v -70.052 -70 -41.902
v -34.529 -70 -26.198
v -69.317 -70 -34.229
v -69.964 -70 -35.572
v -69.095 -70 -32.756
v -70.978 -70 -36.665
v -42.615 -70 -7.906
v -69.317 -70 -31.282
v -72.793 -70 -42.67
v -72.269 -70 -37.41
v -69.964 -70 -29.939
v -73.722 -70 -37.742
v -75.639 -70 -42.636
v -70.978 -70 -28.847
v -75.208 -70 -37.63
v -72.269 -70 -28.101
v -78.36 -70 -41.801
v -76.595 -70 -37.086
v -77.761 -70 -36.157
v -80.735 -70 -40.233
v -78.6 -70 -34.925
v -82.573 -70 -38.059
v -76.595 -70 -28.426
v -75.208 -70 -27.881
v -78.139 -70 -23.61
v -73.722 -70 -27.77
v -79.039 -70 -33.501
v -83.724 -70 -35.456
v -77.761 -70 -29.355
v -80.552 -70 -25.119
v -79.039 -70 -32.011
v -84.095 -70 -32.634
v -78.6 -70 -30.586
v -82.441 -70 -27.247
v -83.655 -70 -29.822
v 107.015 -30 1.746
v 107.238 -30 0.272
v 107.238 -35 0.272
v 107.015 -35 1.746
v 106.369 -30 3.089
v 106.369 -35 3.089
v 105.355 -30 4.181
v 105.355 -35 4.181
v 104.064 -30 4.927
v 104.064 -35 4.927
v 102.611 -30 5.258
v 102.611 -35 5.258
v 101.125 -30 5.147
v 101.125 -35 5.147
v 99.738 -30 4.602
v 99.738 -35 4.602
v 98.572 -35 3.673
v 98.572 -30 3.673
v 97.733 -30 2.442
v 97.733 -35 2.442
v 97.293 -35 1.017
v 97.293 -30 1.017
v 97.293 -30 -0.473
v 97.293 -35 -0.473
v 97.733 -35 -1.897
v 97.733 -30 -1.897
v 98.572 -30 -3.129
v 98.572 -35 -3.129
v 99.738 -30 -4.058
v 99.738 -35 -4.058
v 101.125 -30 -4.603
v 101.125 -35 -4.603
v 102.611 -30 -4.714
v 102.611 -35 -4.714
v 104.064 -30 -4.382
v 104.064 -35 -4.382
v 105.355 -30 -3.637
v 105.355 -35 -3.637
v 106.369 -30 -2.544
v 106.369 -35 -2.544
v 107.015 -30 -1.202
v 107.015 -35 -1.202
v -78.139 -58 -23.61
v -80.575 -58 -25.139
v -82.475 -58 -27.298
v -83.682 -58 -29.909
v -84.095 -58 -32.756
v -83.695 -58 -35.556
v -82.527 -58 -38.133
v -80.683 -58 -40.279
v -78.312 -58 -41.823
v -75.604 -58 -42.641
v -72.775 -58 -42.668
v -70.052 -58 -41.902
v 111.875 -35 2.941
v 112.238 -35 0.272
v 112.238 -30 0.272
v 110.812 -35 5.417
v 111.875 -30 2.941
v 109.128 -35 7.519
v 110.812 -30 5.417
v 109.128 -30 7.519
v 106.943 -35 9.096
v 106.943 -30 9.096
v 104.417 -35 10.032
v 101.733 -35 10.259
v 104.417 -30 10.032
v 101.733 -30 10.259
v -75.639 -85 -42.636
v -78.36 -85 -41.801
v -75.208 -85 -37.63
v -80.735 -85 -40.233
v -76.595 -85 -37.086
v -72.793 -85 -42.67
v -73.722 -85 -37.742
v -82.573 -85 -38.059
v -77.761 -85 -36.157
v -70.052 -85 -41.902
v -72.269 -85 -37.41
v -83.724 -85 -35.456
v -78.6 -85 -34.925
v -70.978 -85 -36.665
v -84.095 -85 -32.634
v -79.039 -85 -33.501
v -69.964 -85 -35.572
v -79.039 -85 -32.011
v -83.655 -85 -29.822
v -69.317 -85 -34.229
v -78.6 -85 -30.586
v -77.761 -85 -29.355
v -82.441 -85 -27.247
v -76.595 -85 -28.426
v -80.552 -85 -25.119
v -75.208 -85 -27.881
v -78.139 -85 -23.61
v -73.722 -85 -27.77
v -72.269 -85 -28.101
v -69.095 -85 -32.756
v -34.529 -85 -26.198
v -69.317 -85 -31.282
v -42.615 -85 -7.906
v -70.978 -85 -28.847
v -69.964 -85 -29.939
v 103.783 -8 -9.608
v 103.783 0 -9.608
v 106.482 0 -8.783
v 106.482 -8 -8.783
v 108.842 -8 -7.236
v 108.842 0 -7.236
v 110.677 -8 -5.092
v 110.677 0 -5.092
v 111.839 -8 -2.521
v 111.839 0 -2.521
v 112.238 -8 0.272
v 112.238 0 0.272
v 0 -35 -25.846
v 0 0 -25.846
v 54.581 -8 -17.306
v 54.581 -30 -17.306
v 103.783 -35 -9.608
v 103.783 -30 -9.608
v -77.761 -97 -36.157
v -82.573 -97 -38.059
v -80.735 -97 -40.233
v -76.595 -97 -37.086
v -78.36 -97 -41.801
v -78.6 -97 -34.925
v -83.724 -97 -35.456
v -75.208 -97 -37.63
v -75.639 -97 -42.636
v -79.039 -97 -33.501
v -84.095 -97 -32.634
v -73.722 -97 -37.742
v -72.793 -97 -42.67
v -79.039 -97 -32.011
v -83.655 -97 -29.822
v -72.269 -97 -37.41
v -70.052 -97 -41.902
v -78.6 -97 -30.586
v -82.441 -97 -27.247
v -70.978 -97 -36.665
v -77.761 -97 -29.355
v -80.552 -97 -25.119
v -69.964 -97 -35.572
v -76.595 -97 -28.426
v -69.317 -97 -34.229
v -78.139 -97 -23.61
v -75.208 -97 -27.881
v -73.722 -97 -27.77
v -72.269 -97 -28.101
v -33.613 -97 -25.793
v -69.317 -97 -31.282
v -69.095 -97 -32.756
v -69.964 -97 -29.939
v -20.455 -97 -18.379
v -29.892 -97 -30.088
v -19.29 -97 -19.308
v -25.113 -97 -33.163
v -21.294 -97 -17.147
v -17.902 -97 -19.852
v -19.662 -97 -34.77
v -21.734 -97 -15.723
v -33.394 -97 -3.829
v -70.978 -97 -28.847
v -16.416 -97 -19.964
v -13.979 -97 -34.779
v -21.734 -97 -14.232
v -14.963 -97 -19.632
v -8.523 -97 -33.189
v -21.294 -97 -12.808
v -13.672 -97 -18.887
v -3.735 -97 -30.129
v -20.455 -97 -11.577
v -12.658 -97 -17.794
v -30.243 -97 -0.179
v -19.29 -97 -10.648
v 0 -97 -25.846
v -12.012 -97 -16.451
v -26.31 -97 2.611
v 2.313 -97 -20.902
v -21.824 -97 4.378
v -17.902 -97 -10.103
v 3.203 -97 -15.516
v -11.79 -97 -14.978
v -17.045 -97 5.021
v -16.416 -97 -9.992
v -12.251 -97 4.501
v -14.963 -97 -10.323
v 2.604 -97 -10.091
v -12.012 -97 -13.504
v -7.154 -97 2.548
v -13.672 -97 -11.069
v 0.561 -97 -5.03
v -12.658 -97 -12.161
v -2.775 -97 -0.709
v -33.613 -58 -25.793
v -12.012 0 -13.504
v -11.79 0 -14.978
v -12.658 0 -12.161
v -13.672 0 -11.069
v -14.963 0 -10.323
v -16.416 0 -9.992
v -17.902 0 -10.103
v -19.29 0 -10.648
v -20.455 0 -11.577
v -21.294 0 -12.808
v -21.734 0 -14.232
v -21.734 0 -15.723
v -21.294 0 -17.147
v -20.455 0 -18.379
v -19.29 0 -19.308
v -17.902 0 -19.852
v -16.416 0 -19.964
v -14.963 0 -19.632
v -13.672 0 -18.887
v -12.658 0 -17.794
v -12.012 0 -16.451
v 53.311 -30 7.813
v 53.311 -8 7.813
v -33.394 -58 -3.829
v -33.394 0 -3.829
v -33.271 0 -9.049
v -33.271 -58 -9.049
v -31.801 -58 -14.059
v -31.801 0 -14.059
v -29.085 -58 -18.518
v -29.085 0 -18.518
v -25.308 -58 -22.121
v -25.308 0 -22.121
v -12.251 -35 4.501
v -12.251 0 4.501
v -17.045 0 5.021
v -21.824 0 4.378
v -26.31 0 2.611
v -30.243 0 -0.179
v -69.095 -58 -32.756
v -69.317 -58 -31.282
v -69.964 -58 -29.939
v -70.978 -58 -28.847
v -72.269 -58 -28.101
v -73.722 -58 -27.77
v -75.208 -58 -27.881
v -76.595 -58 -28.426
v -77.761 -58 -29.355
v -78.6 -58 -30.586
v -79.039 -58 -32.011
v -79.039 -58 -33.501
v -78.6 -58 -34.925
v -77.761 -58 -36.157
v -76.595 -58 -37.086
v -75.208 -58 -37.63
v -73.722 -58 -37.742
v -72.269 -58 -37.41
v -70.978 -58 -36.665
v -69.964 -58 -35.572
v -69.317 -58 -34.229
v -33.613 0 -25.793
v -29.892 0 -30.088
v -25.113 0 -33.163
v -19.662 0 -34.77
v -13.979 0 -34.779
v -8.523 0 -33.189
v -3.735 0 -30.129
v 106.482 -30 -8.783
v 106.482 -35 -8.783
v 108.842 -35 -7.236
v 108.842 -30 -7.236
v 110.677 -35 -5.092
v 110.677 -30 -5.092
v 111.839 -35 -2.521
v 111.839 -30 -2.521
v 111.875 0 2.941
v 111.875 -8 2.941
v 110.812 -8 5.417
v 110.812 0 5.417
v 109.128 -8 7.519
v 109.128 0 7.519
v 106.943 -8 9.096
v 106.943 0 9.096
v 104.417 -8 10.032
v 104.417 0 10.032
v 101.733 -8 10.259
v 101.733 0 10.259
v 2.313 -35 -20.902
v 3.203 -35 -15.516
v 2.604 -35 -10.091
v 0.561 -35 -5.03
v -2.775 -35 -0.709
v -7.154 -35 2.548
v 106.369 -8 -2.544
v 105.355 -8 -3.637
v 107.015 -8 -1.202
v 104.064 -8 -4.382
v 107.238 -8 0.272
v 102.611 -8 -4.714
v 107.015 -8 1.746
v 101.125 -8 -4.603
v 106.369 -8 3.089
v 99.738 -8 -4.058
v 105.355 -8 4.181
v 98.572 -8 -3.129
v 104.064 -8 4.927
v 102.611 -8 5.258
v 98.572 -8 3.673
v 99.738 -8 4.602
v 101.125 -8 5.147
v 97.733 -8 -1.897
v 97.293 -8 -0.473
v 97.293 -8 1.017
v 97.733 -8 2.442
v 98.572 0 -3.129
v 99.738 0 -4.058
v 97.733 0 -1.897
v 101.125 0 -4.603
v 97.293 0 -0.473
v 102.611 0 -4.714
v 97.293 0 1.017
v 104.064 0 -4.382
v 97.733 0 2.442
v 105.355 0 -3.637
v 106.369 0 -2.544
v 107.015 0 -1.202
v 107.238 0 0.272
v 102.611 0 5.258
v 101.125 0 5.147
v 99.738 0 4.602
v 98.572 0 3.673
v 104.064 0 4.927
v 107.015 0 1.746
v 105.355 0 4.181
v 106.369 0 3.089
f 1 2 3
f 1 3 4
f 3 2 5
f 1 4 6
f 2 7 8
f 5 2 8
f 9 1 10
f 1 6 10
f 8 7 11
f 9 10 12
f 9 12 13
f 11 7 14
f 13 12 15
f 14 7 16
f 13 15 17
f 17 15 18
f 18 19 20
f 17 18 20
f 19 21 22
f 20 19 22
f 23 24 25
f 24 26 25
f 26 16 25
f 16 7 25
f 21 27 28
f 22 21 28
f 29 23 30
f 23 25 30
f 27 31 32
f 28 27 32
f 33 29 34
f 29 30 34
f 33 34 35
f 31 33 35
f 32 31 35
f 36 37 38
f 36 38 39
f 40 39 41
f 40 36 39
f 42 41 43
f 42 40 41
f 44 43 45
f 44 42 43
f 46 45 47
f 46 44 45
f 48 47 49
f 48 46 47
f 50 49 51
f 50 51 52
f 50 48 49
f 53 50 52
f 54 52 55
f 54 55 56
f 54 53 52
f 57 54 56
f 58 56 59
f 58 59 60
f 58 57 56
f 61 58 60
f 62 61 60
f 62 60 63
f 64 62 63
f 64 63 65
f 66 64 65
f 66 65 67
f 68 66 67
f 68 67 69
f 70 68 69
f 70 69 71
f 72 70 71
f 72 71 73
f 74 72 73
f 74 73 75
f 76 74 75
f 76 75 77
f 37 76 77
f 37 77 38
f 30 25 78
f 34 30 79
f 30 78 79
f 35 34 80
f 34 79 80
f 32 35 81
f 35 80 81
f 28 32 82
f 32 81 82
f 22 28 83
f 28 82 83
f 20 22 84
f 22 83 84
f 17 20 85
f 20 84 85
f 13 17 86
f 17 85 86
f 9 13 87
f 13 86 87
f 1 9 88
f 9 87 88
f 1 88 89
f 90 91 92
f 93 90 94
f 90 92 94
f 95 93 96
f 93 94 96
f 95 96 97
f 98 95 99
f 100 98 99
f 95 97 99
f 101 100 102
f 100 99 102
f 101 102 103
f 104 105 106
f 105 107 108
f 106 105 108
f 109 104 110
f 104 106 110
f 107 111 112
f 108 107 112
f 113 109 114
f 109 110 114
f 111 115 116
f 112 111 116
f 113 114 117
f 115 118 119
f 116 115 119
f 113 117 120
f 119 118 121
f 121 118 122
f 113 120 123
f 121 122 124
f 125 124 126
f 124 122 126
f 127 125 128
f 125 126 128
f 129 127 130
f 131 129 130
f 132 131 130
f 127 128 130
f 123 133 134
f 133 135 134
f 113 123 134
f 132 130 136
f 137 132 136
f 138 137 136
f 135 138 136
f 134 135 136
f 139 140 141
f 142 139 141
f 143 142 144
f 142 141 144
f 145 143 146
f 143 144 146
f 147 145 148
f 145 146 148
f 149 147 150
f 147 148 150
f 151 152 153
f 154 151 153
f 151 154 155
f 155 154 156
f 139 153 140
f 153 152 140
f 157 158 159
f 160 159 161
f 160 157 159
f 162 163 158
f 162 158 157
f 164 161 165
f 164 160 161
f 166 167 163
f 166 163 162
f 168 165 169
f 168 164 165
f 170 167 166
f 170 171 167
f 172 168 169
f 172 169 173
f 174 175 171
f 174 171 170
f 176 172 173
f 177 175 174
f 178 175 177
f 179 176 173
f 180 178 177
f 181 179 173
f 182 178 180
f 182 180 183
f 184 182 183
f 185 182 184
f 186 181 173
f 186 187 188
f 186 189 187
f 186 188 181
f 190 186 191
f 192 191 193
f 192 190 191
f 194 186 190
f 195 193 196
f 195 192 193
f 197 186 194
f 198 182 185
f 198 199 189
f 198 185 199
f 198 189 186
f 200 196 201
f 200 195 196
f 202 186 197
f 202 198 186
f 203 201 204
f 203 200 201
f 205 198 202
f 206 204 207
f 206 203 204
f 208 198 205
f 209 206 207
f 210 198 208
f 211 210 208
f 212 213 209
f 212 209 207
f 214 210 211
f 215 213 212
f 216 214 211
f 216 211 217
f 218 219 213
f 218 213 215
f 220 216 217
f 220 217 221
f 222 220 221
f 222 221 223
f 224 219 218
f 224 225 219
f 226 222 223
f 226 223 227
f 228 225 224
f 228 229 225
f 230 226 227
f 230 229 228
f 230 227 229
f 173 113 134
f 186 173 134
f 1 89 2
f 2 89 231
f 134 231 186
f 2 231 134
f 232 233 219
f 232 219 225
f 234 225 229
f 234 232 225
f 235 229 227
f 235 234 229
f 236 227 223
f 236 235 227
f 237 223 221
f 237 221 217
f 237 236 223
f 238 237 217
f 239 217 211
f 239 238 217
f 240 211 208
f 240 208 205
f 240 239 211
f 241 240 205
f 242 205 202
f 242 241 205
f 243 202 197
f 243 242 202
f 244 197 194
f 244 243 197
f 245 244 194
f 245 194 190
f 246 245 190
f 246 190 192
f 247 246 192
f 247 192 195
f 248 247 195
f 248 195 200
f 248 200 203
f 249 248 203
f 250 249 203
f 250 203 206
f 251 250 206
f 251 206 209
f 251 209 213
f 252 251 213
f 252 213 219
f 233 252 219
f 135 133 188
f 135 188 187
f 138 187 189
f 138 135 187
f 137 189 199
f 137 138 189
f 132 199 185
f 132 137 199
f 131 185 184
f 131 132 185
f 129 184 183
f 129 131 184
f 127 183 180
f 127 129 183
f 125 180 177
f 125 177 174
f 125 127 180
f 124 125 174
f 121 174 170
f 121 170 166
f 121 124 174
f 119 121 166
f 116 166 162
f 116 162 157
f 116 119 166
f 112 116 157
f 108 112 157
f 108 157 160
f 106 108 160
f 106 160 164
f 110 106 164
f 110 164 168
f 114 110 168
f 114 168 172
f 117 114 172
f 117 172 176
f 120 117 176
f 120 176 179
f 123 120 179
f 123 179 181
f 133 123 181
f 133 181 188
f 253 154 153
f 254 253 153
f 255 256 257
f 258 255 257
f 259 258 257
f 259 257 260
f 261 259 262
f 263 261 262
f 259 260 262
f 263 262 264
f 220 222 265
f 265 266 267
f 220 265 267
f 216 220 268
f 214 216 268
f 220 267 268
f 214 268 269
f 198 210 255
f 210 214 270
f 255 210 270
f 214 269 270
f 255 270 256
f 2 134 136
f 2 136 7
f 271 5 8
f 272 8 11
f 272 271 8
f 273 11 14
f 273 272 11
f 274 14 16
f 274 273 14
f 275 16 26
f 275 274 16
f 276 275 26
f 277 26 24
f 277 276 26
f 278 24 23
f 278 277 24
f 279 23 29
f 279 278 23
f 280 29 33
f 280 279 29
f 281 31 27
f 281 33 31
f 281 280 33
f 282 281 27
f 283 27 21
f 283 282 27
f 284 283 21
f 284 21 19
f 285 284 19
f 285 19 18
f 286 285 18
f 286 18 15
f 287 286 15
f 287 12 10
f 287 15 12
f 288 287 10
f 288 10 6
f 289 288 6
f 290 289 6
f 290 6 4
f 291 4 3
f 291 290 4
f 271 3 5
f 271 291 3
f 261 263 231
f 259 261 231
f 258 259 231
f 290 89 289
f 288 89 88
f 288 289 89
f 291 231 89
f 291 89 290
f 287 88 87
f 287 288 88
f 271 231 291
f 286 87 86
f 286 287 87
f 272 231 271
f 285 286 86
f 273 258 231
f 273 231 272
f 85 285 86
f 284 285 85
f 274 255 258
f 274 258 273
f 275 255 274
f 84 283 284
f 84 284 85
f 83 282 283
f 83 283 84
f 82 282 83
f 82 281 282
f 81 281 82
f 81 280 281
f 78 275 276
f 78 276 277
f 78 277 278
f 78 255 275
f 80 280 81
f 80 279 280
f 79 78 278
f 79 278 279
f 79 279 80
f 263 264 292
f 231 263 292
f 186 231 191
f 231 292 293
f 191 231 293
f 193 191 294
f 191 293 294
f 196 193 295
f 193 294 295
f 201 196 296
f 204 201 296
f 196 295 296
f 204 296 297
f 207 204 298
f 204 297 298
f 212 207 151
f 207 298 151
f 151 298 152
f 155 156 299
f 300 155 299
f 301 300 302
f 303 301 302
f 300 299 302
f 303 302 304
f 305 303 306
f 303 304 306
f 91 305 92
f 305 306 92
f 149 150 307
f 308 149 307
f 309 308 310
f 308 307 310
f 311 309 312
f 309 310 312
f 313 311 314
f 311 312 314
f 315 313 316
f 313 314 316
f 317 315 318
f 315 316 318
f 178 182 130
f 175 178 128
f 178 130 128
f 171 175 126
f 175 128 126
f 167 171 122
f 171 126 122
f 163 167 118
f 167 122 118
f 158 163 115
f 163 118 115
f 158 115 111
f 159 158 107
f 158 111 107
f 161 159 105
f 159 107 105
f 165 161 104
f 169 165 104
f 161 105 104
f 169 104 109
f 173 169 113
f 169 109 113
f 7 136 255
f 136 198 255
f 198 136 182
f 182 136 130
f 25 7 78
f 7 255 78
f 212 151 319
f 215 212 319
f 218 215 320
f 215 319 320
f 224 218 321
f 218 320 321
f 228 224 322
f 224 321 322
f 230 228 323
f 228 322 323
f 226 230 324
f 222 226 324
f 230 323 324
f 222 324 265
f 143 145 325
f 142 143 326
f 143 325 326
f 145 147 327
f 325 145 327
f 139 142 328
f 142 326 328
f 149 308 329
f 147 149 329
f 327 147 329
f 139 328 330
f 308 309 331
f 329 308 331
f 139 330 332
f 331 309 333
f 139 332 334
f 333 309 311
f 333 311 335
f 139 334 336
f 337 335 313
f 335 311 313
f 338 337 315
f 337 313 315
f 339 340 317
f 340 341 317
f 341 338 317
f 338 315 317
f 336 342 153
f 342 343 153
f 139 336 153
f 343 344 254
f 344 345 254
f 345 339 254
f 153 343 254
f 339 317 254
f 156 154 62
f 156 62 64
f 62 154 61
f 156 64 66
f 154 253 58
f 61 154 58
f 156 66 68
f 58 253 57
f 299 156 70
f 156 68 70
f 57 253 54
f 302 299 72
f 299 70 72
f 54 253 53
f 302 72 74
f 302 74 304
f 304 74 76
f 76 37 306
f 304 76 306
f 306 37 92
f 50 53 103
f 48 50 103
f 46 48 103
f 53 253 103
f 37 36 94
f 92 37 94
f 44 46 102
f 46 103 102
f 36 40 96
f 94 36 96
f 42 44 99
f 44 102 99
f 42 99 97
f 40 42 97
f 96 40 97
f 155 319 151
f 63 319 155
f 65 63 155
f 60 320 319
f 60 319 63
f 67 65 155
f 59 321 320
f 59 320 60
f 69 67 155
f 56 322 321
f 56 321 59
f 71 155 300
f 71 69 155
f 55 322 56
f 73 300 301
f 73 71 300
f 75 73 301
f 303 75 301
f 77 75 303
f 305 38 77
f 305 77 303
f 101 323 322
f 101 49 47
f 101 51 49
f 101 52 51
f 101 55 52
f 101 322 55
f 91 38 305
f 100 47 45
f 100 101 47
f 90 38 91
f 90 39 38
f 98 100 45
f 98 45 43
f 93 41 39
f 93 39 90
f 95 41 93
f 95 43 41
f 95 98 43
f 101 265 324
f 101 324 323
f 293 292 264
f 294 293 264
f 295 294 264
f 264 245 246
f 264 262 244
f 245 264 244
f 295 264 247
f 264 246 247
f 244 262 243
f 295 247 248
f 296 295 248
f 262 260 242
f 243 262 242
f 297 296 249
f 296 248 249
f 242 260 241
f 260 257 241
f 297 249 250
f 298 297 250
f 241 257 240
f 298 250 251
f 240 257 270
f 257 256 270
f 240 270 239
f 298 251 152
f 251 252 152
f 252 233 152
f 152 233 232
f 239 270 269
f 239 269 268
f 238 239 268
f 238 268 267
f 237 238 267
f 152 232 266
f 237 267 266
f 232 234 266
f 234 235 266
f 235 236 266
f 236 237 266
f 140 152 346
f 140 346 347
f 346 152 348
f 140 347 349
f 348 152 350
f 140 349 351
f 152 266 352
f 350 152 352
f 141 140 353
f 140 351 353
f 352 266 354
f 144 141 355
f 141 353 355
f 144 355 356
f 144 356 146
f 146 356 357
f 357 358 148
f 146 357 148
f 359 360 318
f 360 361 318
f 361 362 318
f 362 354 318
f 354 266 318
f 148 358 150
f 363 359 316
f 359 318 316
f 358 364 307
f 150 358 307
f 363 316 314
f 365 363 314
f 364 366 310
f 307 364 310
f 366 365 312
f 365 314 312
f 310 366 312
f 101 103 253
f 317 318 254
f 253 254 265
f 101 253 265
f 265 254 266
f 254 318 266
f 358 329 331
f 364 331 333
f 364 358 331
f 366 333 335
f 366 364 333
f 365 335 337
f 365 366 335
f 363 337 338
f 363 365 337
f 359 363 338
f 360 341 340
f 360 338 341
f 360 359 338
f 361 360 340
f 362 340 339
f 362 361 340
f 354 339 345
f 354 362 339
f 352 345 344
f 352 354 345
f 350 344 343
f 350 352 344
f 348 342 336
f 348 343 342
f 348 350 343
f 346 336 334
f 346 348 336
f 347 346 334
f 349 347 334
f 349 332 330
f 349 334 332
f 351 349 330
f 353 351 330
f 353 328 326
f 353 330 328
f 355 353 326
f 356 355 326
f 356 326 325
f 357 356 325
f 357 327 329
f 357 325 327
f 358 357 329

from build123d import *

# Parameters (mm, degrees)
F0_R     = 5
F1_DEPTH = 97
F2_DEPTH = 35
F3_R     = 5
F4_DEPTH = 58
F5_W     = 21.1601814699
F5_H     = 15
F5_W_2   = 38.8398185301
F6_DEPTH = 94.4868054059
F7_W     = 48.4832398096
F7_H     = 22
F7_W_2   = 11.5167601904
F8_DEPTH = 53.4786196206


with BuildPart() as f1:
    # F0 (on Front) → F1 (new body)
    with BuildSketch(Plane.XZ):
        with BuildLine():
            Line((-33.3940822773, -3.829139489), (-78.1385323231, -23.6095790069))
            ThreePointArc((-78.1385323231, -23.6095790069), (-83.2413837038, -36.7990030954), (-70.0519596153, -41.9018544761))
            Line((-70.0519596153, -41.9018544761), (-33.6129821019, -25.7930635521))
            ThreePointArc((-33.6129821019, -25.7930635521), (-16.8207912618, -34.9776541604), (0, -25.8455482049))
            ThreePointArc((0, -25.8455482049), (1.7560740266, -7.4903982751), (-12.2514262399, 4.5006509372))
            ThreePointArc((-12.2514262399, 4.5006509372), (-24.1207121326, 3.6302295915), (-33.3940822773, -3.829139489))
        make_face()
        with Locations((-74.0952459692, -32.7557167415)):
            Circle(F0_R, mode=Mode.SUBTRACT)
        with Locations((-16.789562501, -14.9776785413)):
            Circle(F0_R, mode=Mode.SUBTRACT)
    extrude(amount=F1_DEPTH)

    # F0 (on Front) → F2 (join)
    with BuildSketch(Plane.XZ):
        with BuildLine():
            Line((-33.3940822773, -3.829139489), (-78.1385323231, -23.6095790069))
            ThreePointArc((-78.1385323231, -23.6095790069), (-83.2413837038, -36.7990030954), (-70.0519596153, -41.9018544761))
            Line((-70.0519596153, -41.9018544761), (-33.6129821019, -25.7930635521))
            ThreePointArc((-33.6129821019, -25.7930635521), (-16.8207912618, -34.9776541604), (0, -25.8455482049))
            ThreePointArc((0, -25.8455482049), (1.7560740266, -7.4903982751), (-12.2514262399, 4.5006509372))
            ThreePointArc((-12.2514262399, 4.5006509372), (-24.1207121326, 3.6302295915), (-33.3940822773, -3.829139489))
        make_face()
        with Locations((-74.0952459692, -32.7557167415)):
            Circle(F0_R, mode=Mode.SUBTRACT)
        with Locations((-16.789562501, -14.9776785413)):
            Circle(F0_R, mode=Mode.SUBTRACT)
        with BuildLine():
            Line((101.7329280454, 10.2593952934), (-12.2514262399, 4.5006509372))
            ThreePointArc((-12.2514262399, 4.5006509372), (1.7560740266, -7.4903982751), (0, -25.8455482049))
            Line((0, -25.8455482049), (103.7832955951, -9.6076711141))
            ThreePointArc((103.7832955951, -9.6076711141), (92.2903408389, -0.7544573444), (101.7329280454, 10.2593952934))
        make_face()
        with BuildLine():
            ThreePointArc((112.2375068401, 0.2721333944), (109.1278701125, 7.5194014295), (101.7329280454, 10.2593952934))
            ThreePointArc((101.7329280454, 10.2593952934), (92.2903408389, -0.7544573444), (103.7832955951, -9.6076711141))
            ThreePointArc((103.7832955951, -9.6076711141), (109.8354633926, -6.2294861135), (112.2375068401, 0.2721333944))
        make_face()
        with Locations((102.2375068401, 0.2721333944)):
            Circle(F0_R, mode=Mode.SUBTRACT)
    extrude(amount=F2_DEPTH)

    # F3 (on face) → F4 (cut)
    with BuildSketch(Plane(origin=(0, 0, 0), x_dir=(-1, 0, 0), z_dir=(0, 1, 0))):
        with BuildLine():
            ThreePointArc((33.3940822773, -3.829139489), (31.8014961432, -14.0586725369), (25.3075095695, -22.1214149583))
            Line((25.3075095695, -22.1214149583), (33.6129821019, -25.7930635521))
            Line((33.6129821019, -25.7930635521), (70.0519596153, -41.9018544761))
            ThreePointArc((70.0519596153, -41.9018544761), (64.9491082346, -28.7124303876), (78.1385323231, -23.6095790069))
            Line((78.1385323231, -23.6095790069), (33.3940822773, -3.829139489))
        make_face()
        with BuildLine():
            ThreePointArc((84.0952459692, -32.7557167415), (82.4747705243, -27.2982843571), (78.1385323231, -23.6095790069))
            ThreePointArc((78.1385323231, -23.6095790069), (64.9491082346, -28.7124303876), (70.0519596153, -41.9018544761))
            ThreePointArc((70.0519596153, -41.9018544761), (79.5526783536, -41.1352412966), (84.0952459692, -32.7557167415))
        make_face()
        with Locations((74.0952459692, -32.7557167415)):
            Circle(F3_R, mode=Mode.SUBTRACT)
    extrude(amount=-F4_DEPTH, mode=Mode.SUBTRACT)

    # F5 (on face) → F6 (cut, through all)
    with BuildSketch(Plane(origin=(-4.0432863539, 0, 9.1461377346), x_dir=(0.9146137735, 0, 0.4043286354), z_dir=(-0.4043286354, 0, 0.9146137735))):
        with Locations((-91.5926974976, -77.5)):
            Rectangle(F5_W, F5_H)
        with Locations((-61.5926974976, -77.5)):
            Rectangle(F5_W_2, F5_H)
    extrude(amount=-F6_DEPTH, mode=Mode.SUBTRACT)

    # F7 (on face) → F8 (cut, through all)
    with BuildSketch(Plane(origin=(-0.2579961306, 0, 5.1065858341), x_dir=(0.9987261899, 0, 0.0504578795), z_dir=(-0.0504578795, 0, 0.9987261899))):
        with Locations((77.8793870409, -19)):
            Rectangle(F7_W, F7_H)
        with Locations((107.8793870409, -19)):
            Rectangle(F7_W_2, F7_H)
    extrude(amount=-F8_DEPTH, mode=Mode.SUBTRACT)


solid = f1.part
